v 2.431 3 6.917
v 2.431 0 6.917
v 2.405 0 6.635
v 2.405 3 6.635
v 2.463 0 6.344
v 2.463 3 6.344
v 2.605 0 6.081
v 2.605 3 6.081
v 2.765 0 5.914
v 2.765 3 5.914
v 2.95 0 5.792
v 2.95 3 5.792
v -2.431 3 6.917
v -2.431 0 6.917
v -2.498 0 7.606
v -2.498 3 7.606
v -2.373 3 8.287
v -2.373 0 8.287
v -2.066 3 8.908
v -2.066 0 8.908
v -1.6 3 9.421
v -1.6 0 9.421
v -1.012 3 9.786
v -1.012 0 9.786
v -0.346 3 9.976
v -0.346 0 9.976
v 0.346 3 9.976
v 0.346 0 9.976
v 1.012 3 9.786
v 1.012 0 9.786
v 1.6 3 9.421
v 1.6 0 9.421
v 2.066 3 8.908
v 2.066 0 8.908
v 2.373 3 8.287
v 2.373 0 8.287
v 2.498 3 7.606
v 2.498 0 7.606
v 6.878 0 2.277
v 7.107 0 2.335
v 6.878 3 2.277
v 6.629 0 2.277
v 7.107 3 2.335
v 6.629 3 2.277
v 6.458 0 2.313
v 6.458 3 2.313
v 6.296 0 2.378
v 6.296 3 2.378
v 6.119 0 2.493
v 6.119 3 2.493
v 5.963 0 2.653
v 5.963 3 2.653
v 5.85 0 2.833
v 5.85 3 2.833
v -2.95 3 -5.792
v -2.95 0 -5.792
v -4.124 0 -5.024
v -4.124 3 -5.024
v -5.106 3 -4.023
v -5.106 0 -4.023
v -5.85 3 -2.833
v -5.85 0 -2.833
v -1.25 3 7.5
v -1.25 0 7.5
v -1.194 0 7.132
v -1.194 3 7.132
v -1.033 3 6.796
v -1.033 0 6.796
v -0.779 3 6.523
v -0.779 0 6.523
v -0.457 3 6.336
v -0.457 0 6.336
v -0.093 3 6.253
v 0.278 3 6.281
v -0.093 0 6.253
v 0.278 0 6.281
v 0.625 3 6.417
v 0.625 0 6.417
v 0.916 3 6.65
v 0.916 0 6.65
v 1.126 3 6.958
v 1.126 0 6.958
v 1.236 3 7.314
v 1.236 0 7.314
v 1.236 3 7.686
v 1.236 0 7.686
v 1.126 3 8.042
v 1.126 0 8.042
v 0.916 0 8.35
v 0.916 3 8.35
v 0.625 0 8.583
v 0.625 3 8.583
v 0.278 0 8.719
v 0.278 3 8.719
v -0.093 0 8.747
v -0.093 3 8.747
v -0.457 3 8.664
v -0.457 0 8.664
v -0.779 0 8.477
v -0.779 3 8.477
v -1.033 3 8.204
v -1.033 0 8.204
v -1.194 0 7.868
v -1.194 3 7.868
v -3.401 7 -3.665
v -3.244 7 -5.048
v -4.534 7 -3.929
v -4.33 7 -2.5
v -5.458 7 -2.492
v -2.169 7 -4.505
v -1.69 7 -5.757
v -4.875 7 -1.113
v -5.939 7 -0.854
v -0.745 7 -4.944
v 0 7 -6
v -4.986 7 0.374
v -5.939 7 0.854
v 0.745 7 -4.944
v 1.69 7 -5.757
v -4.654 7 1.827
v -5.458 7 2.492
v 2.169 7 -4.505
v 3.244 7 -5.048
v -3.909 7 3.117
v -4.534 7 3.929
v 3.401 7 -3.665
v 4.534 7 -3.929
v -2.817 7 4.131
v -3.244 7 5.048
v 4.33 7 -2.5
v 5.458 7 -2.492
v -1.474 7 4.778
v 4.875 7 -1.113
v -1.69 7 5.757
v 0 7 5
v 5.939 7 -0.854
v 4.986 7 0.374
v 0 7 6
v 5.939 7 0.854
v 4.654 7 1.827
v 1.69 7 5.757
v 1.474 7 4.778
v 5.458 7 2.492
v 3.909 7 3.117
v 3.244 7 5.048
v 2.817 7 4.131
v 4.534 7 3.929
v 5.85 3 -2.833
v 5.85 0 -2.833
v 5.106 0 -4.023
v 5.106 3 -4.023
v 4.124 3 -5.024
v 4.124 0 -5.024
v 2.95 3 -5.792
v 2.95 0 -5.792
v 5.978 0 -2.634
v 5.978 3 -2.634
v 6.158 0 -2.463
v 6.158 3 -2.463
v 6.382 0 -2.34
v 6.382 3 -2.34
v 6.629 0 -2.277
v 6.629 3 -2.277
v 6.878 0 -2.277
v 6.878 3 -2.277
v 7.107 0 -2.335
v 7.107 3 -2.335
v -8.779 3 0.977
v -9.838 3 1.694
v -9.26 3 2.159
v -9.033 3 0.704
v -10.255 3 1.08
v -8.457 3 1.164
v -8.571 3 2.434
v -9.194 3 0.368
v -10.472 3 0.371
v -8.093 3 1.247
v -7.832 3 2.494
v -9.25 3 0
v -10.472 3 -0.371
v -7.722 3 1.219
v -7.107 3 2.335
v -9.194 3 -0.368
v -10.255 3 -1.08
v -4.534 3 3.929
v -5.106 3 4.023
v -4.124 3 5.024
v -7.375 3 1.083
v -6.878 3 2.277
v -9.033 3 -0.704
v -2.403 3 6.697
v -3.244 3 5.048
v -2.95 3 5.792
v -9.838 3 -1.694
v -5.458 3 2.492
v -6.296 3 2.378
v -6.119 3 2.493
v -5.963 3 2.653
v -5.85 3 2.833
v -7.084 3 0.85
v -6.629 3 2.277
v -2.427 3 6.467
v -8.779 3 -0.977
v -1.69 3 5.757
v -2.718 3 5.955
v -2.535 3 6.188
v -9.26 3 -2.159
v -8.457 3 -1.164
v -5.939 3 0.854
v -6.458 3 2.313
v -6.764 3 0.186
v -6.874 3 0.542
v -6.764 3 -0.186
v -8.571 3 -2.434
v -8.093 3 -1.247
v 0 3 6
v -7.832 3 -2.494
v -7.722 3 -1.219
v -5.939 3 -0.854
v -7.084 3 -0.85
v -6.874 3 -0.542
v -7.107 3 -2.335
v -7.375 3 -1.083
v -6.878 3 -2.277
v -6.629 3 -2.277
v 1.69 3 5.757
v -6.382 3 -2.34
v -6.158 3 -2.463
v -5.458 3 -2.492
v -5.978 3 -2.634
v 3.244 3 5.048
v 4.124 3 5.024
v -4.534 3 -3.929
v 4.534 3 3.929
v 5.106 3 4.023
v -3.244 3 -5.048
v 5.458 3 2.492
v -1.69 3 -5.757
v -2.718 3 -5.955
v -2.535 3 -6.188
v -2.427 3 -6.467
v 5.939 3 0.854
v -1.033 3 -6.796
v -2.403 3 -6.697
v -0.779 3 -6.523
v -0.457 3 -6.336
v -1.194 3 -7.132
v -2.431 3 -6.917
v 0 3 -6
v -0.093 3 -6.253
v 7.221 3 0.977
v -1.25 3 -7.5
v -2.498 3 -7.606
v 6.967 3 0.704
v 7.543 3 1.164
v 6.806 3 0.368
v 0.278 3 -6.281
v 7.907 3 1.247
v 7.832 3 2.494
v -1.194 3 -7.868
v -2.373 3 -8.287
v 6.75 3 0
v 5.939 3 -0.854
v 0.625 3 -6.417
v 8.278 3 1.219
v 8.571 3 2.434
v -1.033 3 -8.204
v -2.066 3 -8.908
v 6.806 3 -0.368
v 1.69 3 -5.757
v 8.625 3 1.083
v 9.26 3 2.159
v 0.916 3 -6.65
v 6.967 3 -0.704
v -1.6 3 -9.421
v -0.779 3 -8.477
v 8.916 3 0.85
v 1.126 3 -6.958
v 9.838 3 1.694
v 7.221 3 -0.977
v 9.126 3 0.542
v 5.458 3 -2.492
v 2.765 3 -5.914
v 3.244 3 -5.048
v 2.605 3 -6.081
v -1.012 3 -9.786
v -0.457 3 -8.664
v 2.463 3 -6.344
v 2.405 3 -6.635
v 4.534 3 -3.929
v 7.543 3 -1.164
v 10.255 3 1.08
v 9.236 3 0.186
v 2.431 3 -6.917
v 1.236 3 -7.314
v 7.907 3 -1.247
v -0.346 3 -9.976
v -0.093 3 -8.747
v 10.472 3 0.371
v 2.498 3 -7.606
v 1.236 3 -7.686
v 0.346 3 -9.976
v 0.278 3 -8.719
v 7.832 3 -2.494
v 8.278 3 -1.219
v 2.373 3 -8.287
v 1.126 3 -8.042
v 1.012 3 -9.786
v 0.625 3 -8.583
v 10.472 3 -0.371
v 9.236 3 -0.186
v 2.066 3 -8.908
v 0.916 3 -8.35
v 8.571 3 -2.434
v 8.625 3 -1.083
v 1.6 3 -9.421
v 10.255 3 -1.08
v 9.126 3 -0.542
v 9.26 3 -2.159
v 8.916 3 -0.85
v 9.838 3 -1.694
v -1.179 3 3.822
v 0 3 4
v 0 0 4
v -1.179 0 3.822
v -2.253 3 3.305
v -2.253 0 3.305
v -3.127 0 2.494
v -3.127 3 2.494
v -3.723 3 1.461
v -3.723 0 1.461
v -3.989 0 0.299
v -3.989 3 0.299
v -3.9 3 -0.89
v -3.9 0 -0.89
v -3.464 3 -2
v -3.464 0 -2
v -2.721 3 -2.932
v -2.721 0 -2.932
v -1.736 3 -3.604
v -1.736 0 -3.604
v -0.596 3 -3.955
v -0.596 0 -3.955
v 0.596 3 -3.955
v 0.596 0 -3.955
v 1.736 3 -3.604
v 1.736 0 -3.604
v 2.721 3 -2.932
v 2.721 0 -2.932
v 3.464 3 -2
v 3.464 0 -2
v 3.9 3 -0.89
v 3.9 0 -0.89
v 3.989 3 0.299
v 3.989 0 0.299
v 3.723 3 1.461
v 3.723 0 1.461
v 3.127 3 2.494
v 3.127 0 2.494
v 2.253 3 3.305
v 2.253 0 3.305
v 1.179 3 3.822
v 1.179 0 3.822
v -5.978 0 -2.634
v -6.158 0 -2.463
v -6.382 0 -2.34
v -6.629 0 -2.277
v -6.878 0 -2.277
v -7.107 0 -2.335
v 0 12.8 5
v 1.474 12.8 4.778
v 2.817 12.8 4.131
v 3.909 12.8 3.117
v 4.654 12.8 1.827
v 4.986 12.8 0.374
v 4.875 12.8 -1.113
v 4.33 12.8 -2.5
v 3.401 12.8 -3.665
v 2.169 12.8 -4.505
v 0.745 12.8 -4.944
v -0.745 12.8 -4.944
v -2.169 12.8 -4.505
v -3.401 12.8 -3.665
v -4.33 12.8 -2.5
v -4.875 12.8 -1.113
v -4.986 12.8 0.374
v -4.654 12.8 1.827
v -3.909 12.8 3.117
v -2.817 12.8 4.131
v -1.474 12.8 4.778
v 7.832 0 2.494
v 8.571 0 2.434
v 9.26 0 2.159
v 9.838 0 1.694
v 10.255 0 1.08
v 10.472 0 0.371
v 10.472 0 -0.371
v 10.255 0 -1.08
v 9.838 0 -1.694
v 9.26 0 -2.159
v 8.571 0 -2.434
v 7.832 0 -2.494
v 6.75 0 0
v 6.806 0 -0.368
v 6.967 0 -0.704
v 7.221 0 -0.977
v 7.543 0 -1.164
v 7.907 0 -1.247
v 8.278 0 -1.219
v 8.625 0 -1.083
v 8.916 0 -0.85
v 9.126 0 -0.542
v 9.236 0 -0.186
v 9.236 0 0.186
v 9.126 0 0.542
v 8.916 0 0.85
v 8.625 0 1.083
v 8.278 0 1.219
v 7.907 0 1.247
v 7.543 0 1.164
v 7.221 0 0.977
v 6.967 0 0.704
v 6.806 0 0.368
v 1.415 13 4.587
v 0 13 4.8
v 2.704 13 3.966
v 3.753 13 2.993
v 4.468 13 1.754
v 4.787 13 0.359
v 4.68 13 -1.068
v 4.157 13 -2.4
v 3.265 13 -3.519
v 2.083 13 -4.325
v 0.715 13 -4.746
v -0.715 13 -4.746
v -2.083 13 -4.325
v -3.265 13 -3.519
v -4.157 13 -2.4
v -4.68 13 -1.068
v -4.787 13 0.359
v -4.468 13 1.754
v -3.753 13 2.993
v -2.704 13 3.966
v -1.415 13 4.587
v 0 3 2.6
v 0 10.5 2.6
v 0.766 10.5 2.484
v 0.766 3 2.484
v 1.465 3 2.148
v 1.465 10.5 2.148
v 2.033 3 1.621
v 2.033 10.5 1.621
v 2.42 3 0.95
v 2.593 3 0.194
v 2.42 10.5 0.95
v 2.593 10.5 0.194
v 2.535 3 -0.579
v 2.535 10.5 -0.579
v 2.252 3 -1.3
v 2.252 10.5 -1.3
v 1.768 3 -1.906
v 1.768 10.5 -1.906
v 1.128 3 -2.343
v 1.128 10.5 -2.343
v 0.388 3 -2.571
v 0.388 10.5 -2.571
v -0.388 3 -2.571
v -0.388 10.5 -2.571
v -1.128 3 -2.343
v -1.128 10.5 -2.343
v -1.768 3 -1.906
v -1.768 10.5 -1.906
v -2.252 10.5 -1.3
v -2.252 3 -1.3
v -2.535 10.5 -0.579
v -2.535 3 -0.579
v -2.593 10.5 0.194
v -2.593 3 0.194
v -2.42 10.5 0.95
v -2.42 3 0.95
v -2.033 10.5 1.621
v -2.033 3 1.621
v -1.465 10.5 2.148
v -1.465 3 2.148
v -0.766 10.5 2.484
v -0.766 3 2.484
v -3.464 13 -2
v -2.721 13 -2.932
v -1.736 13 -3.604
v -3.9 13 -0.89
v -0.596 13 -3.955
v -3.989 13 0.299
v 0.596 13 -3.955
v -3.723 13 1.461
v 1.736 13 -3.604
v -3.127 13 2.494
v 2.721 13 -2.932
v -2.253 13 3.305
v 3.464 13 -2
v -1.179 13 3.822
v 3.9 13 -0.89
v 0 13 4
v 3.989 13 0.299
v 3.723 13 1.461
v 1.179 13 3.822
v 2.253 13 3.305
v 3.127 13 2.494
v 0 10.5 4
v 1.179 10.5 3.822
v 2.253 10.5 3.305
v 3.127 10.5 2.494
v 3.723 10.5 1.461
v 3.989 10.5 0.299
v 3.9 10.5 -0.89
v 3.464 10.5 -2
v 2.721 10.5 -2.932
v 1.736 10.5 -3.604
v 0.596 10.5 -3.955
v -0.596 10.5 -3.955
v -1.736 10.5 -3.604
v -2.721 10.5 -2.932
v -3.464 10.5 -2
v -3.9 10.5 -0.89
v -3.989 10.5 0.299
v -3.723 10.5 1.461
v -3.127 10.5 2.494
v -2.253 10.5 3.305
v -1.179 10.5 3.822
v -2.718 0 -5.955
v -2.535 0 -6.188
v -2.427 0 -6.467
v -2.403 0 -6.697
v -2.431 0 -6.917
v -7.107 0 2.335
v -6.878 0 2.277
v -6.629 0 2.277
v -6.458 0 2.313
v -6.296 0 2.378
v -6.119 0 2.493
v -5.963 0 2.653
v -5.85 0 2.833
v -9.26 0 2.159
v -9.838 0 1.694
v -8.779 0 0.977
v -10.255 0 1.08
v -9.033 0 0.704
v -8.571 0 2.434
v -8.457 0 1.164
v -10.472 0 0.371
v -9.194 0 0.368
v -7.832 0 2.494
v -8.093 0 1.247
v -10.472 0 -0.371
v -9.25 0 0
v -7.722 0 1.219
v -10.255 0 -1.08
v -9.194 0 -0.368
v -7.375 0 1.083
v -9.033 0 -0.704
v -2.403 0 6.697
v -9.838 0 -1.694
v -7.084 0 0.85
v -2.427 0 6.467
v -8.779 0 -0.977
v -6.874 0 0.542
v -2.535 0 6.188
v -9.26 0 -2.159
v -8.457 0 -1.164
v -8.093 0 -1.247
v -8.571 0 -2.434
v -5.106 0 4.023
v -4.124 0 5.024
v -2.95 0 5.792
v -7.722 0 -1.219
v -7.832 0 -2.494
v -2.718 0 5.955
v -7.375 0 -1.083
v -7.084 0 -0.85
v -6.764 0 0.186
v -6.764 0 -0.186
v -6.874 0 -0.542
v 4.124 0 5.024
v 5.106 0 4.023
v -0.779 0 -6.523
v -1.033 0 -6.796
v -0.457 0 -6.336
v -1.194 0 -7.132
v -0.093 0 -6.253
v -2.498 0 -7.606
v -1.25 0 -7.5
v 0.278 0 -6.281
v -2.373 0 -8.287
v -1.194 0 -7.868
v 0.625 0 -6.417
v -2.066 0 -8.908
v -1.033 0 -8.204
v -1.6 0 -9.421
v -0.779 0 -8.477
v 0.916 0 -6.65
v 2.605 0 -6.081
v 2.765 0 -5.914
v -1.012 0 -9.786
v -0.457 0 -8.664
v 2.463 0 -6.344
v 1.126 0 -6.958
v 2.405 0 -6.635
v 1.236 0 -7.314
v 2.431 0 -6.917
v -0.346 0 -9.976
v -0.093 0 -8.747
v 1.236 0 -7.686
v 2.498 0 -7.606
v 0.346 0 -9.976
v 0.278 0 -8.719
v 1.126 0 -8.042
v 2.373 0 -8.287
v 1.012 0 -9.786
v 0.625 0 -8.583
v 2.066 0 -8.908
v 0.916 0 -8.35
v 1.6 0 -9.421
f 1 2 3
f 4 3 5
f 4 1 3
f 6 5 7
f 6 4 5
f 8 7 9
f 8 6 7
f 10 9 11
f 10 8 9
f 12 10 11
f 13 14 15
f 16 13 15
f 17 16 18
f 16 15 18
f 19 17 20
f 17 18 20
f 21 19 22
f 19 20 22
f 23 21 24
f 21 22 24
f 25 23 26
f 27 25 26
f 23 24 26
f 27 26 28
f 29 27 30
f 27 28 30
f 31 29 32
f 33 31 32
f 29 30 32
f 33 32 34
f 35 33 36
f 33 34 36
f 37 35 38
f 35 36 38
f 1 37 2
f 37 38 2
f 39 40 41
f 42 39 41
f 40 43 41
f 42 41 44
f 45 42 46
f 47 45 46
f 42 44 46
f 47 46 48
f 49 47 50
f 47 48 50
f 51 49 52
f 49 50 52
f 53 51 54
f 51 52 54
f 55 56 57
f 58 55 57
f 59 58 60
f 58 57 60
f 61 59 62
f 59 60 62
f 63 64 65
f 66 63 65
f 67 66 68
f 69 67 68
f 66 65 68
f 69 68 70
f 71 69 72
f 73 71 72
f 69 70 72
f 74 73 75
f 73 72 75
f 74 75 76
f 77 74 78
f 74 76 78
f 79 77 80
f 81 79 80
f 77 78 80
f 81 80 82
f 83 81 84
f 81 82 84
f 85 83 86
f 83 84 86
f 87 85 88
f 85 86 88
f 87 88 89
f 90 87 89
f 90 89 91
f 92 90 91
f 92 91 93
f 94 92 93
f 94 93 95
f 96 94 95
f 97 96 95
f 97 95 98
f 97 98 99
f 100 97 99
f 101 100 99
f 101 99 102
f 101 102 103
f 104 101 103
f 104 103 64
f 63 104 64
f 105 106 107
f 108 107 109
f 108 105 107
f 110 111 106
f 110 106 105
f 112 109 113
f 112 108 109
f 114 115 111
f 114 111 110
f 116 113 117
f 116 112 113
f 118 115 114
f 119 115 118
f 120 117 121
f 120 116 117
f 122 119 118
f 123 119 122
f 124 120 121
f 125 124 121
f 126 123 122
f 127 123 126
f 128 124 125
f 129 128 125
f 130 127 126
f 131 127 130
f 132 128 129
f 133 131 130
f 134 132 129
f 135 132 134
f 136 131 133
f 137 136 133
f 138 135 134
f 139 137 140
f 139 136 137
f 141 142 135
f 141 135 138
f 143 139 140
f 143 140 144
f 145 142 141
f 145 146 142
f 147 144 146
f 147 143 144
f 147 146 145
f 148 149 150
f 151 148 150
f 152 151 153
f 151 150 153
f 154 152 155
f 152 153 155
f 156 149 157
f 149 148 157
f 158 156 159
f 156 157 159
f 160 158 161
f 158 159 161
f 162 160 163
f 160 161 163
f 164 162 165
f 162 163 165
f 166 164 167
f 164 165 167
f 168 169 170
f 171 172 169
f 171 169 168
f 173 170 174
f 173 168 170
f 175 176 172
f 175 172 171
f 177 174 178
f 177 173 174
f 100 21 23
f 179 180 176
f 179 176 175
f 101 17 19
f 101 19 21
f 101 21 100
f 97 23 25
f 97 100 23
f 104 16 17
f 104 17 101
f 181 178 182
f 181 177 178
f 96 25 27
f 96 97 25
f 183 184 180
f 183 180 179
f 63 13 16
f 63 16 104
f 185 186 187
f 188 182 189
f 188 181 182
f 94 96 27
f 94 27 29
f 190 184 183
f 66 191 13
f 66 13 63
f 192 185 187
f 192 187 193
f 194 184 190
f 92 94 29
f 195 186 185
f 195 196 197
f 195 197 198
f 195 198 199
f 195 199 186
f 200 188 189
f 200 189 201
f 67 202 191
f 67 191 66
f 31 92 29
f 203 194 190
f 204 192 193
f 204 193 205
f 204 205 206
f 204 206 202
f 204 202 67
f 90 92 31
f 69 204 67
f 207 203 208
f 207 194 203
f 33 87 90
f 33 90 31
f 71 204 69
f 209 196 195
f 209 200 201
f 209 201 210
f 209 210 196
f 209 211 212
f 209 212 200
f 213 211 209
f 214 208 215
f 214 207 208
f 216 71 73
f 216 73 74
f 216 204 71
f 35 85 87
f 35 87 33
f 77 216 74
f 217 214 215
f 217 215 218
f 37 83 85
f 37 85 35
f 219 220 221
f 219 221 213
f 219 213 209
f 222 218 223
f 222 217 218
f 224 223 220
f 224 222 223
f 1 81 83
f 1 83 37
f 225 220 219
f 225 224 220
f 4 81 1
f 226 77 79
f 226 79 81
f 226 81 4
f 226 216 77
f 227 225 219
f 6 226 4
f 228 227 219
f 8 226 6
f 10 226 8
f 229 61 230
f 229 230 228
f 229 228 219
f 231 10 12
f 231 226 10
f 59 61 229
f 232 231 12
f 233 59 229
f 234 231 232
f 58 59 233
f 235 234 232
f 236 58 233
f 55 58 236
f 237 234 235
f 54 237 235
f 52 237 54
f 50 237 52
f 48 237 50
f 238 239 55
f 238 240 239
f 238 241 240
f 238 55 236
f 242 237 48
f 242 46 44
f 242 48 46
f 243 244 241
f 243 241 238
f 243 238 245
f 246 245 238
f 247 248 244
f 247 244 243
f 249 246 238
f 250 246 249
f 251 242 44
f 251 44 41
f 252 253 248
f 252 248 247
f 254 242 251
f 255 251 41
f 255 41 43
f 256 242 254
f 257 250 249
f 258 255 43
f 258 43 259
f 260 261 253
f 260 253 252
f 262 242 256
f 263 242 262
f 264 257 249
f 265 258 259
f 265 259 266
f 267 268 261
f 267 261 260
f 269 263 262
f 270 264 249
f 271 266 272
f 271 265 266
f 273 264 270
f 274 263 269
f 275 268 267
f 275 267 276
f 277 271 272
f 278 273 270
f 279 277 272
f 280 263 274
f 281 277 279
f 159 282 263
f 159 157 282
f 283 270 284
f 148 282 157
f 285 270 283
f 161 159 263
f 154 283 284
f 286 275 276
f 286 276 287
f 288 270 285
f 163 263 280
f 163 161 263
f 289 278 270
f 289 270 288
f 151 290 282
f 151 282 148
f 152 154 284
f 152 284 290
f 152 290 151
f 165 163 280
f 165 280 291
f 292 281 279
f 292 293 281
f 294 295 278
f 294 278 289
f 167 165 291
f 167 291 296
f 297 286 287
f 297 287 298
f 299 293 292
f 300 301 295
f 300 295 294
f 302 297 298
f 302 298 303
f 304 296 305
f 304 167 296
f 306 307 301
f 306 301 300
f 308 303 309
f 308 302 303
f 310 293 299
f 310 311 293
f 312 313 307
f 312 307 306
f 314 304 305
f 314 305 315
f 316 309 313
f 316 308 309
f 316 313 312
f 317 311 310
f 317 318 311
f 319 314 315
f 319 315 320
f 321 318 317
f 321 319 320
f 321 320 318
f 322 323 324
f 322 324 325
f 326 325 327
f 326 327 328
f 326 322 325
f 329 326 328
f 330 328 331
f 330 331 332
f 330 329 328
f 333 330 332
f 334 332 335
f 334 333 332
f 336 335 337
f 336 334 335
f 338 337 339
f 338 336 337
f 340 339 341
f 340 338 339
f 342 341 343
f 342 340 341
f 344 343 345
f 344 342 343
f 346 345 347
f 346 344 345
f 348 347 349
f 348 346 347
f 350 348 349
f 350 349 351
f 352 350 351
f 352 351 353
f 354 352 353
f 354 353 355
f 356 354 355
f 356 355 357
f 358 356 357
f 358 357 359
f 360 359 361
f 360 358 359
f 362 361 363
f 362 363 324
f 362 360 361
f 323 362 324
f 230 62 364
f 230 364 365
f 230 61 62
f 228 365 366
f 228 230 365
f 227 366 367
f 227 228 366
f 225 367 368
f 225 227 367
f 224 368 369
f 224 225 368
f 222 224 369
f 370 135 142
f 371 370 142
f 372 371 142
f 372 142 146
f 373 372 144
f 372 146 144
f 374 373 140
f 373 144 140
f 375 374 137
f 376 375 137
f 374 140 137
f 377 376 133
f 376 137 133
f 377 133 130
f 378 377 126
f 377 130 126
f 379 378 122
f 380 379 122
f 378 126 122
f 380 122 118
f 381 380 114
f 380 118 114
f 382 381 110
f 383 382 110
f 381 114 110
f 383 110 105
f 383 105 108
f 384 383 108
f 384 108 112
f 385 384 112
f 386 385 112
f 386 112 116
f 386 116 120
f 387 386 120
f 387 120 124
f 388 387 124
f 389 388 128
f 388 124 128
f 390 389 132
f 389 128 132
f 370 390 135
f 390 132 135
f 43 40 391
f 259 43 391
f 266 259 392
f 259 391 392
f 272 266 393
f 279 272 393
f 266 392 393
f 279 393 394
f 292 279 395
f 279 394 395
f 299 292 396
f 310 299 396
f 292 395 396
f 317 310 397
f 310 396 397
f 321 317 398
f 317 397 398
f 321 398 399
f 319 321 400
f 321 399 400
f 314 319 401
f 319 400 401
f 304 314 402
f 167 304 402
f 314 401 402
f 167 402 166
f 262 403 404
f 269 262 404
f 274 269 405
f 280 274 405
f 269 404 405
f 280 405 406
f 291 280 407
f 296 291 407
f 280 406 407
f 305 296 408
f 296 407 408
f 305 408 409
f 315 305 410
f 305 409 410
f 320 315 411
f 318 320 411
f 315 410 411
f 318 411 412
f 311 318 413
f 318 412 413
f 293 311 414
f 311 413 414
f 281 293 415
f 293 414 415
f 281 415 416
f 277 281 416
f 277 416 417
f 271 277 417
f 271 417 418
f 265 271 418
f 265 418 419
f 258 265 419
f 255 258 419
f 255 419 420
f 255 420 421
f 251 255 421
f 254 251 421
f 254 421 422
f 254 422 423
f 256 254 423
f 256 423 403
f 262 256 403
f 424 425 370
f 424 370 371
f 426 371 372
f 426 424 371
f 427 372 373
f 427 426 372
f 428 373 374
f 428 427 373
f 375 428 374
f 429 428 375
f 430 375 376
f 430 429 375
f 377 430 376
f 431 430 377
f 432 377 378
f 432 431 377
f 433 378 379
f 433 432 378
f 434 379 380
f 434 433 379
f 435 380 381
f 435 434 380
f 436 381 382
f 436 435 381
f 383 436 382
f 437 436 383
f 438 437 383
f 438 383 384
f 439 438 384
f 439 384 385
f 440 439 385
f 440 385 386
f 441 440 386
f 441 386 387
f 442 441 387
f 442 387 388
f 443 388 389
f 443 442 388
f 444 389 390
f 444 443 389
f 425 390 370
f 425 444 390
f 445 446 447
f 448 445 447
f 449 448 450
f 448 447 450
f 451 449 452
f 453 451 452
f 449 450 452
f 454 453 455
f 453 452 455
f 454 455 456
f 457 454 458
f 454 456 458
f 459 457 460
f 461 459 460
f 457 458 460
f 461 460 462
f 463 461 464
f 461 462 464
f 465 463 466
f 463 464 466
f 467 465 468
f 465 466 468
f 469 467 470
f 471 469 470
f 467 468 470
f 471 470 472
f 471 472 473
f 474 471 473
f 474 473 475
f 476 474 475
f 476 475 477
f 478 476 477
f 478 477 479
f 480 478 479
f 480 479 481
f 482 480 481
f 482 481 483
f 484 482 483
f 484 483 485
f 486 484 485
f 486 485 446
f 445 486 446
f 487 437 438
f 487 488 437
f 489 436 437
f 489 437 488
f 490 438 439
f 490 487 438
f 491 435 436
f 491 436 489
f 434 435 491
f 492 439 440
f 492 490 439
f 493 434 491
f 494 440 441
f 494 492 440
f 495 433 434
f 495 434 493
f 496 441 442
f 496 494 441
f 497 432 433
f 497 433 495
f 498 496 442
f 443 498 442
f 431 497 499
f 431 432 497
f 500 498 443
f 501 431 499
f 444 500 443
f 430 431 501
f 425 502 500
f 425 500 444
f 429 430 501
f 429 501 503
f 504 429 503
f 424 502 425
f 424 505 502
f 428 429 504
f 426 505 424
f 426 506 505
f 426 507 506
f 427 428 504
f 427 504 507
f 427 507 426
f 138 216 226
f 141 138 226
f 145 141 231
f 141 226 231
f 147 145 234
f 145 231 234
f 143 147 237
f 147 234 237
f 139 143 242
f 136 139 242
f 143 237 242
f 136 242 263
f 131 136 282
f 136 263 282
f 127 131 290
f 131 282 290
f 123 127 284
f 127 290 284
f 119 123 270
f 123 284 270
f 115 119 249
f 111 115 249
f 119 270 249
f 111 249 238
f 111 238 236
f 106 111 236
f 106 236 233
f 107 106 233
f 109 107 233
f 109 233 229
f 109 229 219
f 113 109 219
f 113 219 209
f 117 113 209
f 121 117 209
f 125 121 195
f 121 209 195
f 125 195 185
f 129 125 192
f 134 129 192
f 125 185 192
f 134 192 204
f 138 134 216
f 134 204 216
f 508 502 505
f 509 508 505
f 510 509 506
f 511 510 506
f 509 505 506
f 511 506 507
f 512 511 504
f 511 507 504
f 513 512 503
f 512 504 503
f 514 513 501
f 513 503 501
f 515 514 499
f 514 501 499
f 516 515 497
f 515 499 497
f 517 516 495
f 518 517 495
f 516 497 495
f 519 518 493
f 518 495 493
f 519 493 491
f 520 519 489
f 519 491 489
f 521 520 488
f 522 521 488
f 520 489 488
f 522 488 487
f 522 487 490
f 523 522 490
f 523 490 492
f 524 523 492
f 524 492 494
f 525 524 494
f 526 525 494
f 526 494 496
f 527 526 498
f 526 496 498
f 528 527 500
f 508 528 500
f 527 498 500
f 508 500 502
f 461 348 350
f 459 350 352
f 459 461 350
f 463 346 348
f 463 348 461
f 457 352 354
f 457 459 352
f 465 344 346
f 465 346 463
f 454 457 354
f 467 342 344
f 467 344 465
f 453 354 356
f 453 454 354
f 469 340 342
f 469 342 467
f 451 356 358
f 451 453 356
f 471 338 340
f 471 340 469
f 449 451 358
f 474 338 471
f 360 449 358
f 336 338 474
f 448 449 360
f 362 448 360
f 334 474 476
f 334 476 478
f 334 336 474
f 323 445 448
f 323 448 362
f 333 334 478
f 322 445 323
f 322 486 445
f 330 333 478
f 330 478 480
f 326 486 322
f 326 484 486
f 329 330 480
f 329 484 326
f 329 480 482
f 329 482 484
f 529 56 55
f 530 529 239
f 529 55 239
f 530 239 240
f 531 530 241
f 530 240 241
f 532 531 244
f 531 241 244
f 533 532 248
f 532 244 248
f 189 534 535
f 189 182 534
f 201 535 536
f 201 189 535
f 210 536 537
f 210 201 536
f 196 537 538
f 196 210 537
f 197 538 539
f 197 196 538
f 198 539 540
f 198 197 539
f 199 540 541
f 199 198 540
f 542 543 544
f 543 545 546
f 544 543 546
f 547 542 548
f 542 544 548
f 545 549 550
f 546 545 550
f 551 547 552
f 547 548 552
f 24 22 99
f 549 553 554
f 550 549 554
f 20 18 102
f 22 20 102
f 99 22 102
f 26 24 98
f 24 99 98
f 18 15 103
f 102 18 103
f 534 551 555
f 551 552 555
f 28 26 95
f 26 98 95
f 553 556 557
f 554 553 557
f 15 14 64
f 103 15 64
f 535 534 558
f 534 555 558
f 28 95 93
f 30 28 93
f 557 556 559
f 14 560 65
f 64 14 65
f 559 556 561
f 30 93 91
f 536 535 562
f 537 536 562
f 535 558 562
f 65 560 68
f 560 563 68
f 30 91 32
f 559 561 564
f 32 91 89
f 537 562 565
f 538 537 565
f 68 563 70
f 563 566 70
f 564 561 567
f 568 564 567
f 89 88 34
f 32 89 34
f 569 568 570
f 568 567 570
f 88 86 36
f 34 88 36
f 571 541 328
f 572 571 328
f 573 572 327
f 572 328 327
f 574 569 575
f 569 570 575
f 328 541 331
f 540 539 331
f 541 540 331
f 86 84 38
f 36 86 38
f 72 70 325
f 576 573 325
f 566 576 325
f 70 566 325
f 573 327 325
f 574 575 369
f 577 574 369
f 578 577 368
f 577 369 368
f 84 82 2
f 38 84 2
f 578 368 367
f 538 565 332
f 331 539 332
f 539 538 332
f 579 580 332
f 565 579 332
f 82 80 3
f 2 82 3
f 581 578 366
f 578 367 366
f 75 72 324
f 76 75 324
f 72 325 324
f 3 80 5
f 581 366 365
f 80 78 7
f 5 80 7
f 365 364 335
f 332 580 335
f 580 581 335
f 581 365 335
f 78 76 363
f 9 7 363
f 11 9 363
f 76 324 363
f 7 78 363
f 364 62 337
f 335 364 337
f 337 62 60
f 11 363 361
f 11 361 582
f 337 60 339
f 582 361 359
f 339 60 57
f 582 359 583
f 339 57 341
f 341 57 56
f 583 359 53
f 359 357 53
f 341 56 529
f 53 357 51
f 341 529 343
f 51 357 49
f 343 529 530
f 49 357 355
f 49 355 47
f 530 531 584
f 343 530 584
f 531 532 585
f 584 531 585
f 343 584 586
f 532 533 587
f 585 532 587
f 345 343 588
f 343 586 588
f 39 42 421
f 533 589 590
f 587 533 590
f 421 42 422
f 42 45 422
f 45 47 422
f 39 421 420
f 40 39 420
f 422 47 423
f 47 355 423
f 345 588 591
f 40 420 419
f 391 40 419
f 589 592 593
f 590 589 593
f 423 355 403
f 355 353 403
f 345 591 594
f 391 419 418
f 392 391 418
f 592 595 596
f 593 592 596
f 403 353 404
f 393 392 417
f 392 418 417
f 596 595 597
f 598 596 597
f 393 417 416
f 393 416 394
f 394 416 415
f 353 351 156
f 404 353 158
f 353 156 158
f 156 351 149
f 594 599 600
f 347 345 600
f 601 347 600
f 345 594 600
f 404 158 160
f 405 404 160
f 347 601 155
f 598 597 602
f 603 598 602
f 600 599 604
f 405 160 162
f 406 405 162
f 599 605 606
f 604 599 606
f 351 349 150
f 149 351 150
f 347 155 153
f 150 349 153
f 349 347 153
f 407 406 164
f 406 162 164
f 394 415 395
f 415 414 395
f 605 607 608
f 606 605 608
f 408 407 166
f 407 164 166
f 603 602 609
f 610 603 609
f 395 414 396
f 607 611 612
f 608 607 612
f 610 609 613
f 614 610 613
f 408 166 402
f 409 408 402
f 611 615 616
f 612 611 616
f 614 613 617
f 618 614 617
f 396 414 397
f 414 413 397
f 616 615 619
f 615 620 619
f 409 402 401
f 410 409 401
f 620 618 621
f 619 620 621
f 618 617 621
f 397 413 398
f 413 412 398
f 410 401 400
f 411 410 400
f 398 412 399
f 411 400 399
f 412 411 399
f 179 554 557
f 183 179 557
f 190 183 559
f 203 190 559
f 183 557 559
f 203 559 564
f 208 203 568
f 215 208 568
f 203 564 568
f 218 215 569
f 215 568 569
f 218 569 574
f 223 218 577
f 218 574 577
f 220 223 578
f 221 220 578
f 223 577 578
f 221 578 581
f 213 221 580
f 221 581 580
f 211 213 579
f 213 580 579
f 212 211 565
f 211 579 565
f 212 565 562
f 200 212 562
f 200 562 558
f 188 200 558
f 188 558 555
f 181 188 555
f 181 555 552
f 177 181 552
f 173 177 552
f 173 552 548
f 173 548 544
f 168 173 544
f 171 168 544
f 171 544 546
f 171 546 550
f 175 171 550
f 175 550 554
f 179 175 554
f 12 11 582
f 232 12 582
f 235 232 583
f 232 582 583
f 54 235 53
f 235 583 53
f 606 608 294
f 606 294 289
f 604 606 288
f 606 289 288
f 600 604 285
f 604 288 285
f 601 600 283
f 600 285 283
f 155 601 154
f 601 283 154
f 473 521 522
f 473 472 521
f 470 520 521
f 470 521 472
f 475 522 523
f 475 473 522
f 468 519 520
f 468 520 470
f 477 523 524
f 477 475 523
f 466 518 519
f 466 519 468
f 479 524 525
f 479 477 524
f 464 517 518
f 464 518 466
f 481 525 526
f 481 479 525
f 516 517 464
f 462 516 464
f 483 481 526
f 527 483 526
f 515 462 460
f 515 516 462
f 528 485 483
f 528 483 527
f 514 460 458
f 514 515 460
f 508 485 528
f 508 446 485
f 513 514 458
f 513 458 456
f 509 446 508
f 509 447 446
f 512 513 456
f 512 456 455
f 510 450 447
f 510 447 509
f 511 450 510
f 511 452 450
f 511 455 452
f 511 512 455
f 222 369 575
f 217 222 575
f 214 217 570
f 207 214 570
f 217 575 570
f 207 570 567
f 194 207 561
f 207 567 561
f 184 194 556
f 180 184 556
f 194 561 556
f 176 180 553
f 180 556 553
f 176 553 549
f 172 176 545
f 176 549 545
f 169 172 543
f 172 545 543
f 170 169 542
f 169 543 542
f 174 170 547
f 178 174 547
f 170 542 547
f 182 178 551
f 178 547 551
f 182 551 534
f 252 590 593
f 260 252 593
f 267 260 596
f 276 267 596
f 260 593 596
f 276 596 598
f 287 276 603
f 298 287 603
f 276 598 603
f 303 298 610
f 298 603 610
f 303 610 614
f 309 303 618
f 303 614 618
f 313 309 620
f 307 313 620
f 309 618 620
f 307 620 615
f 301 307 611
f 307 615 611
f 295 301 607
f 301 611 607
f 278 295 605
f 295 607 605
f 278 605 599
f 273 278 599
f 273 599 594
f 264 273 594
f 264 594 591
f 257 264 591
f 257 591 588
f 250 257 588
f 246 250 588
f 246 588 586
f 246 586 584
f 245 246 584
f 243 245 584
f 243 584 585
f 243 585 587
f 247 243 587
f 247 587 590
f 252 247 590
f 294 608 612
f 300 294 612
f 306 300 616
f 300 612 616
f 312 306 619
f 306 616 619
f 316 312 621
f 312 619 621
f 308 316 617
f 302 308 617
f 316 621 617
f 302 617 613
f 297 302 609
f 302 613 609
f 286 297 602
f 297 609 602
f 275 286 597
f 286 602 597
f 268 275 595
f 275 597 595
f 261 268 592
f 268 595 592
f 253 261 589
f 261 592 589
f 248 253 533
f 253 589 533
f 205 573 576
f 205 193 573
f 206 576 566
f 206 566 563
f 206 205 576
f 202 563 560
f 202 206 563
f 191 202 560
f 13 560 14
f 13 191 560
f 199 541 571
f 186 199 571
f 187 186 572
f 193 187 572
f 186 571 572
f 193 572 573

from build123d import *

# Parameters (mm, degrees)
BOSS_EXTRUDE1_DEPTH   = 3
SKETCH2_R             = 6
BOSS_EXTRUDE2_DEPTH   = 4
SKETCH3_R             = 5
BOSS_EXTRUDE3_DEPTH   = 6
SKETCH4_R             = 2.6
CUT_EXTRUDE1_DEPTH    = 20.474342094
SKETCH5_R             = 4
CUT_EXTRUDE2_DEPTH    = 2.5
CUT_EXTRUDE3_START    = -3
SKETCH6_R             = 4
CUT_EXTRUDE3_DEPTH    = 3
M3X0_5_TAPPED_HOLE1_D = 2.5
CHAMFER1_SIZE         = 0.2
FILLET1_R             = 1


with BuildPart() as part:
    # Sketch1 → Boss-Extrude1 (new body)
    with BuildSketch(Plane(origin=(0, 0, 0), x_dir=(1, 0, 0), z_dir=(0, 1, 0))):
        with BuildLine():
            ThreePointArc((-2.104162541, 6.15), (-4.71280541, 4.47654612), (-6.25, 1.785357107))
            ThreePointArc((-6.25, 1.785357107), (-10.5, 0), (-6.25, -1.785357107))
            ThreePointArc((-6.25, -1.785357107), (-4.71280541, -4.47654612), (-2.104162541, -6.15))
            ThreePointArc((-2.104162541, -6.15), (0, -10), (2.104162541, -6.15))
            ThreePointArc((2.104162541, -6.15), (4.71280541, -4.47654612), (6.25, -1.785357107))
            ThreePointArc((6.25, -1.785357107), (10.5, 0), (6.25, 1.785357107))
            ThreePointArc((6.25, 1.785357107), (4.71280541, 4.47654612), (2.104162541, 6.15))
            ThreePointArc((2.104162541, 6.15), (0, 10), (-2.104162541, 6.15))
        make_face()
    extrude(amount=BOSS_EXTRUDE1_DEPTH)

    # Sketch2 → Boss-Extrude2 (add)
    with BuildSketch(Plane(origin=(0, 3, 0), x_dir=(1, 0, 0), z_dir=(0, 1, 0))):
        with Locations(Location((0, 0, 0), (0, 0, 270))):
            Circle(SKETCH2_R)
    extrude(amount=BOSS_EXTRUDE2_DEPTH)

    # Sketch3 → Boss-Extrude3 (add)
    with BuildSketch(Plane(origin=(0, 7, 0), x_dir=(1, 0, 0), z_dir=(0, 1, 0))):
        with Locations(Location((0, 0, 0), (0, 0, 270))):
            Circle(SKETCH3_R)
    extrude(amount=BOSS_EXTRUDE3_DEPTH)

    # Sketch4 → Cut-Extrude1 (cut, through all)
    with BuildSketch(Plane(origin=(0, 13, 0), x_dir=(1, 0, 0), z_dir=(0, 1, 0))):
        with Locations(Location((0, 0, 0), (0, 0, 270))):
            Circle(SKETCH4_R)
    extrude(amount=-CUT_EXTRUDE1_DEPTH, mode=Mode.SUBTRACT)

    # Sketch5 → Cut-Extrude2 (cut)
    with BuildSketch(Plane(origin=(0, 13, 0), x_dir=(1, 0, 0), z_dir=(0, 1, 0))):
        with Locations(Location((0, 0, 0), (0, 0, 270))):
            Circle(SKETCH5_R)
    extrude(amount=-CUT_EXTRUDE2_DEPTH, mode=Mode.SUBTRACT)

    # Sketch6 → Cut-Extrude3 (cut)
    with BuildSketch(Plane.XZ.offset(CUT_EXTRUDE3_START)):
        with Locations(Location((0, 0, 0), (0, 0, 90))):
            Circle(SKETCH6_R)
    extrude(amount=CUT_EXTRUDE3_DEPTH, mode=Mode.SUBTRACT)

    # M3x0.5 Tapped Hole1 (through all)
    with Locations(Plane(origin=(0, 3, 0), x_dir=(1, 0, 0), z_dir=(0, 1, 0))):
        with Locations((0, 7.5), (8, 0), (0, -7.5), (-8, 0)):
            Hole(M3X0_5_TAPPED_HOLE1_D / 2)

    # Chamfer1
    chamfer1_edges = [part.edges().sort_by_distance(p)[0] for p in [
        (0, 13, -5),
    ]]
    chamfer(chamfer1_edges, length=CHAMFER1_SIZE)

    # Fillet1
    fillet1_edges = [part.edges().sort_by_distance(p)[0] for p in [
        (6.25, 1.5, -1.785357107),
        (6.25, 1.5, 1.785357107),
        (2.104162541, 1.5, 6.15),
        (-2.104162541, 1.5, 6.15),
        (-6.25, 1.5, 1.785357107),
        (-6.25, 1.5, -1.785357107),
        (-2.104162541, 1.5, -6.15),
        (2.104162541, 1.5, -6.15),
    ]]
    fillet(fillet1_edges, radius=FILLET1_R)


solid = part.part
